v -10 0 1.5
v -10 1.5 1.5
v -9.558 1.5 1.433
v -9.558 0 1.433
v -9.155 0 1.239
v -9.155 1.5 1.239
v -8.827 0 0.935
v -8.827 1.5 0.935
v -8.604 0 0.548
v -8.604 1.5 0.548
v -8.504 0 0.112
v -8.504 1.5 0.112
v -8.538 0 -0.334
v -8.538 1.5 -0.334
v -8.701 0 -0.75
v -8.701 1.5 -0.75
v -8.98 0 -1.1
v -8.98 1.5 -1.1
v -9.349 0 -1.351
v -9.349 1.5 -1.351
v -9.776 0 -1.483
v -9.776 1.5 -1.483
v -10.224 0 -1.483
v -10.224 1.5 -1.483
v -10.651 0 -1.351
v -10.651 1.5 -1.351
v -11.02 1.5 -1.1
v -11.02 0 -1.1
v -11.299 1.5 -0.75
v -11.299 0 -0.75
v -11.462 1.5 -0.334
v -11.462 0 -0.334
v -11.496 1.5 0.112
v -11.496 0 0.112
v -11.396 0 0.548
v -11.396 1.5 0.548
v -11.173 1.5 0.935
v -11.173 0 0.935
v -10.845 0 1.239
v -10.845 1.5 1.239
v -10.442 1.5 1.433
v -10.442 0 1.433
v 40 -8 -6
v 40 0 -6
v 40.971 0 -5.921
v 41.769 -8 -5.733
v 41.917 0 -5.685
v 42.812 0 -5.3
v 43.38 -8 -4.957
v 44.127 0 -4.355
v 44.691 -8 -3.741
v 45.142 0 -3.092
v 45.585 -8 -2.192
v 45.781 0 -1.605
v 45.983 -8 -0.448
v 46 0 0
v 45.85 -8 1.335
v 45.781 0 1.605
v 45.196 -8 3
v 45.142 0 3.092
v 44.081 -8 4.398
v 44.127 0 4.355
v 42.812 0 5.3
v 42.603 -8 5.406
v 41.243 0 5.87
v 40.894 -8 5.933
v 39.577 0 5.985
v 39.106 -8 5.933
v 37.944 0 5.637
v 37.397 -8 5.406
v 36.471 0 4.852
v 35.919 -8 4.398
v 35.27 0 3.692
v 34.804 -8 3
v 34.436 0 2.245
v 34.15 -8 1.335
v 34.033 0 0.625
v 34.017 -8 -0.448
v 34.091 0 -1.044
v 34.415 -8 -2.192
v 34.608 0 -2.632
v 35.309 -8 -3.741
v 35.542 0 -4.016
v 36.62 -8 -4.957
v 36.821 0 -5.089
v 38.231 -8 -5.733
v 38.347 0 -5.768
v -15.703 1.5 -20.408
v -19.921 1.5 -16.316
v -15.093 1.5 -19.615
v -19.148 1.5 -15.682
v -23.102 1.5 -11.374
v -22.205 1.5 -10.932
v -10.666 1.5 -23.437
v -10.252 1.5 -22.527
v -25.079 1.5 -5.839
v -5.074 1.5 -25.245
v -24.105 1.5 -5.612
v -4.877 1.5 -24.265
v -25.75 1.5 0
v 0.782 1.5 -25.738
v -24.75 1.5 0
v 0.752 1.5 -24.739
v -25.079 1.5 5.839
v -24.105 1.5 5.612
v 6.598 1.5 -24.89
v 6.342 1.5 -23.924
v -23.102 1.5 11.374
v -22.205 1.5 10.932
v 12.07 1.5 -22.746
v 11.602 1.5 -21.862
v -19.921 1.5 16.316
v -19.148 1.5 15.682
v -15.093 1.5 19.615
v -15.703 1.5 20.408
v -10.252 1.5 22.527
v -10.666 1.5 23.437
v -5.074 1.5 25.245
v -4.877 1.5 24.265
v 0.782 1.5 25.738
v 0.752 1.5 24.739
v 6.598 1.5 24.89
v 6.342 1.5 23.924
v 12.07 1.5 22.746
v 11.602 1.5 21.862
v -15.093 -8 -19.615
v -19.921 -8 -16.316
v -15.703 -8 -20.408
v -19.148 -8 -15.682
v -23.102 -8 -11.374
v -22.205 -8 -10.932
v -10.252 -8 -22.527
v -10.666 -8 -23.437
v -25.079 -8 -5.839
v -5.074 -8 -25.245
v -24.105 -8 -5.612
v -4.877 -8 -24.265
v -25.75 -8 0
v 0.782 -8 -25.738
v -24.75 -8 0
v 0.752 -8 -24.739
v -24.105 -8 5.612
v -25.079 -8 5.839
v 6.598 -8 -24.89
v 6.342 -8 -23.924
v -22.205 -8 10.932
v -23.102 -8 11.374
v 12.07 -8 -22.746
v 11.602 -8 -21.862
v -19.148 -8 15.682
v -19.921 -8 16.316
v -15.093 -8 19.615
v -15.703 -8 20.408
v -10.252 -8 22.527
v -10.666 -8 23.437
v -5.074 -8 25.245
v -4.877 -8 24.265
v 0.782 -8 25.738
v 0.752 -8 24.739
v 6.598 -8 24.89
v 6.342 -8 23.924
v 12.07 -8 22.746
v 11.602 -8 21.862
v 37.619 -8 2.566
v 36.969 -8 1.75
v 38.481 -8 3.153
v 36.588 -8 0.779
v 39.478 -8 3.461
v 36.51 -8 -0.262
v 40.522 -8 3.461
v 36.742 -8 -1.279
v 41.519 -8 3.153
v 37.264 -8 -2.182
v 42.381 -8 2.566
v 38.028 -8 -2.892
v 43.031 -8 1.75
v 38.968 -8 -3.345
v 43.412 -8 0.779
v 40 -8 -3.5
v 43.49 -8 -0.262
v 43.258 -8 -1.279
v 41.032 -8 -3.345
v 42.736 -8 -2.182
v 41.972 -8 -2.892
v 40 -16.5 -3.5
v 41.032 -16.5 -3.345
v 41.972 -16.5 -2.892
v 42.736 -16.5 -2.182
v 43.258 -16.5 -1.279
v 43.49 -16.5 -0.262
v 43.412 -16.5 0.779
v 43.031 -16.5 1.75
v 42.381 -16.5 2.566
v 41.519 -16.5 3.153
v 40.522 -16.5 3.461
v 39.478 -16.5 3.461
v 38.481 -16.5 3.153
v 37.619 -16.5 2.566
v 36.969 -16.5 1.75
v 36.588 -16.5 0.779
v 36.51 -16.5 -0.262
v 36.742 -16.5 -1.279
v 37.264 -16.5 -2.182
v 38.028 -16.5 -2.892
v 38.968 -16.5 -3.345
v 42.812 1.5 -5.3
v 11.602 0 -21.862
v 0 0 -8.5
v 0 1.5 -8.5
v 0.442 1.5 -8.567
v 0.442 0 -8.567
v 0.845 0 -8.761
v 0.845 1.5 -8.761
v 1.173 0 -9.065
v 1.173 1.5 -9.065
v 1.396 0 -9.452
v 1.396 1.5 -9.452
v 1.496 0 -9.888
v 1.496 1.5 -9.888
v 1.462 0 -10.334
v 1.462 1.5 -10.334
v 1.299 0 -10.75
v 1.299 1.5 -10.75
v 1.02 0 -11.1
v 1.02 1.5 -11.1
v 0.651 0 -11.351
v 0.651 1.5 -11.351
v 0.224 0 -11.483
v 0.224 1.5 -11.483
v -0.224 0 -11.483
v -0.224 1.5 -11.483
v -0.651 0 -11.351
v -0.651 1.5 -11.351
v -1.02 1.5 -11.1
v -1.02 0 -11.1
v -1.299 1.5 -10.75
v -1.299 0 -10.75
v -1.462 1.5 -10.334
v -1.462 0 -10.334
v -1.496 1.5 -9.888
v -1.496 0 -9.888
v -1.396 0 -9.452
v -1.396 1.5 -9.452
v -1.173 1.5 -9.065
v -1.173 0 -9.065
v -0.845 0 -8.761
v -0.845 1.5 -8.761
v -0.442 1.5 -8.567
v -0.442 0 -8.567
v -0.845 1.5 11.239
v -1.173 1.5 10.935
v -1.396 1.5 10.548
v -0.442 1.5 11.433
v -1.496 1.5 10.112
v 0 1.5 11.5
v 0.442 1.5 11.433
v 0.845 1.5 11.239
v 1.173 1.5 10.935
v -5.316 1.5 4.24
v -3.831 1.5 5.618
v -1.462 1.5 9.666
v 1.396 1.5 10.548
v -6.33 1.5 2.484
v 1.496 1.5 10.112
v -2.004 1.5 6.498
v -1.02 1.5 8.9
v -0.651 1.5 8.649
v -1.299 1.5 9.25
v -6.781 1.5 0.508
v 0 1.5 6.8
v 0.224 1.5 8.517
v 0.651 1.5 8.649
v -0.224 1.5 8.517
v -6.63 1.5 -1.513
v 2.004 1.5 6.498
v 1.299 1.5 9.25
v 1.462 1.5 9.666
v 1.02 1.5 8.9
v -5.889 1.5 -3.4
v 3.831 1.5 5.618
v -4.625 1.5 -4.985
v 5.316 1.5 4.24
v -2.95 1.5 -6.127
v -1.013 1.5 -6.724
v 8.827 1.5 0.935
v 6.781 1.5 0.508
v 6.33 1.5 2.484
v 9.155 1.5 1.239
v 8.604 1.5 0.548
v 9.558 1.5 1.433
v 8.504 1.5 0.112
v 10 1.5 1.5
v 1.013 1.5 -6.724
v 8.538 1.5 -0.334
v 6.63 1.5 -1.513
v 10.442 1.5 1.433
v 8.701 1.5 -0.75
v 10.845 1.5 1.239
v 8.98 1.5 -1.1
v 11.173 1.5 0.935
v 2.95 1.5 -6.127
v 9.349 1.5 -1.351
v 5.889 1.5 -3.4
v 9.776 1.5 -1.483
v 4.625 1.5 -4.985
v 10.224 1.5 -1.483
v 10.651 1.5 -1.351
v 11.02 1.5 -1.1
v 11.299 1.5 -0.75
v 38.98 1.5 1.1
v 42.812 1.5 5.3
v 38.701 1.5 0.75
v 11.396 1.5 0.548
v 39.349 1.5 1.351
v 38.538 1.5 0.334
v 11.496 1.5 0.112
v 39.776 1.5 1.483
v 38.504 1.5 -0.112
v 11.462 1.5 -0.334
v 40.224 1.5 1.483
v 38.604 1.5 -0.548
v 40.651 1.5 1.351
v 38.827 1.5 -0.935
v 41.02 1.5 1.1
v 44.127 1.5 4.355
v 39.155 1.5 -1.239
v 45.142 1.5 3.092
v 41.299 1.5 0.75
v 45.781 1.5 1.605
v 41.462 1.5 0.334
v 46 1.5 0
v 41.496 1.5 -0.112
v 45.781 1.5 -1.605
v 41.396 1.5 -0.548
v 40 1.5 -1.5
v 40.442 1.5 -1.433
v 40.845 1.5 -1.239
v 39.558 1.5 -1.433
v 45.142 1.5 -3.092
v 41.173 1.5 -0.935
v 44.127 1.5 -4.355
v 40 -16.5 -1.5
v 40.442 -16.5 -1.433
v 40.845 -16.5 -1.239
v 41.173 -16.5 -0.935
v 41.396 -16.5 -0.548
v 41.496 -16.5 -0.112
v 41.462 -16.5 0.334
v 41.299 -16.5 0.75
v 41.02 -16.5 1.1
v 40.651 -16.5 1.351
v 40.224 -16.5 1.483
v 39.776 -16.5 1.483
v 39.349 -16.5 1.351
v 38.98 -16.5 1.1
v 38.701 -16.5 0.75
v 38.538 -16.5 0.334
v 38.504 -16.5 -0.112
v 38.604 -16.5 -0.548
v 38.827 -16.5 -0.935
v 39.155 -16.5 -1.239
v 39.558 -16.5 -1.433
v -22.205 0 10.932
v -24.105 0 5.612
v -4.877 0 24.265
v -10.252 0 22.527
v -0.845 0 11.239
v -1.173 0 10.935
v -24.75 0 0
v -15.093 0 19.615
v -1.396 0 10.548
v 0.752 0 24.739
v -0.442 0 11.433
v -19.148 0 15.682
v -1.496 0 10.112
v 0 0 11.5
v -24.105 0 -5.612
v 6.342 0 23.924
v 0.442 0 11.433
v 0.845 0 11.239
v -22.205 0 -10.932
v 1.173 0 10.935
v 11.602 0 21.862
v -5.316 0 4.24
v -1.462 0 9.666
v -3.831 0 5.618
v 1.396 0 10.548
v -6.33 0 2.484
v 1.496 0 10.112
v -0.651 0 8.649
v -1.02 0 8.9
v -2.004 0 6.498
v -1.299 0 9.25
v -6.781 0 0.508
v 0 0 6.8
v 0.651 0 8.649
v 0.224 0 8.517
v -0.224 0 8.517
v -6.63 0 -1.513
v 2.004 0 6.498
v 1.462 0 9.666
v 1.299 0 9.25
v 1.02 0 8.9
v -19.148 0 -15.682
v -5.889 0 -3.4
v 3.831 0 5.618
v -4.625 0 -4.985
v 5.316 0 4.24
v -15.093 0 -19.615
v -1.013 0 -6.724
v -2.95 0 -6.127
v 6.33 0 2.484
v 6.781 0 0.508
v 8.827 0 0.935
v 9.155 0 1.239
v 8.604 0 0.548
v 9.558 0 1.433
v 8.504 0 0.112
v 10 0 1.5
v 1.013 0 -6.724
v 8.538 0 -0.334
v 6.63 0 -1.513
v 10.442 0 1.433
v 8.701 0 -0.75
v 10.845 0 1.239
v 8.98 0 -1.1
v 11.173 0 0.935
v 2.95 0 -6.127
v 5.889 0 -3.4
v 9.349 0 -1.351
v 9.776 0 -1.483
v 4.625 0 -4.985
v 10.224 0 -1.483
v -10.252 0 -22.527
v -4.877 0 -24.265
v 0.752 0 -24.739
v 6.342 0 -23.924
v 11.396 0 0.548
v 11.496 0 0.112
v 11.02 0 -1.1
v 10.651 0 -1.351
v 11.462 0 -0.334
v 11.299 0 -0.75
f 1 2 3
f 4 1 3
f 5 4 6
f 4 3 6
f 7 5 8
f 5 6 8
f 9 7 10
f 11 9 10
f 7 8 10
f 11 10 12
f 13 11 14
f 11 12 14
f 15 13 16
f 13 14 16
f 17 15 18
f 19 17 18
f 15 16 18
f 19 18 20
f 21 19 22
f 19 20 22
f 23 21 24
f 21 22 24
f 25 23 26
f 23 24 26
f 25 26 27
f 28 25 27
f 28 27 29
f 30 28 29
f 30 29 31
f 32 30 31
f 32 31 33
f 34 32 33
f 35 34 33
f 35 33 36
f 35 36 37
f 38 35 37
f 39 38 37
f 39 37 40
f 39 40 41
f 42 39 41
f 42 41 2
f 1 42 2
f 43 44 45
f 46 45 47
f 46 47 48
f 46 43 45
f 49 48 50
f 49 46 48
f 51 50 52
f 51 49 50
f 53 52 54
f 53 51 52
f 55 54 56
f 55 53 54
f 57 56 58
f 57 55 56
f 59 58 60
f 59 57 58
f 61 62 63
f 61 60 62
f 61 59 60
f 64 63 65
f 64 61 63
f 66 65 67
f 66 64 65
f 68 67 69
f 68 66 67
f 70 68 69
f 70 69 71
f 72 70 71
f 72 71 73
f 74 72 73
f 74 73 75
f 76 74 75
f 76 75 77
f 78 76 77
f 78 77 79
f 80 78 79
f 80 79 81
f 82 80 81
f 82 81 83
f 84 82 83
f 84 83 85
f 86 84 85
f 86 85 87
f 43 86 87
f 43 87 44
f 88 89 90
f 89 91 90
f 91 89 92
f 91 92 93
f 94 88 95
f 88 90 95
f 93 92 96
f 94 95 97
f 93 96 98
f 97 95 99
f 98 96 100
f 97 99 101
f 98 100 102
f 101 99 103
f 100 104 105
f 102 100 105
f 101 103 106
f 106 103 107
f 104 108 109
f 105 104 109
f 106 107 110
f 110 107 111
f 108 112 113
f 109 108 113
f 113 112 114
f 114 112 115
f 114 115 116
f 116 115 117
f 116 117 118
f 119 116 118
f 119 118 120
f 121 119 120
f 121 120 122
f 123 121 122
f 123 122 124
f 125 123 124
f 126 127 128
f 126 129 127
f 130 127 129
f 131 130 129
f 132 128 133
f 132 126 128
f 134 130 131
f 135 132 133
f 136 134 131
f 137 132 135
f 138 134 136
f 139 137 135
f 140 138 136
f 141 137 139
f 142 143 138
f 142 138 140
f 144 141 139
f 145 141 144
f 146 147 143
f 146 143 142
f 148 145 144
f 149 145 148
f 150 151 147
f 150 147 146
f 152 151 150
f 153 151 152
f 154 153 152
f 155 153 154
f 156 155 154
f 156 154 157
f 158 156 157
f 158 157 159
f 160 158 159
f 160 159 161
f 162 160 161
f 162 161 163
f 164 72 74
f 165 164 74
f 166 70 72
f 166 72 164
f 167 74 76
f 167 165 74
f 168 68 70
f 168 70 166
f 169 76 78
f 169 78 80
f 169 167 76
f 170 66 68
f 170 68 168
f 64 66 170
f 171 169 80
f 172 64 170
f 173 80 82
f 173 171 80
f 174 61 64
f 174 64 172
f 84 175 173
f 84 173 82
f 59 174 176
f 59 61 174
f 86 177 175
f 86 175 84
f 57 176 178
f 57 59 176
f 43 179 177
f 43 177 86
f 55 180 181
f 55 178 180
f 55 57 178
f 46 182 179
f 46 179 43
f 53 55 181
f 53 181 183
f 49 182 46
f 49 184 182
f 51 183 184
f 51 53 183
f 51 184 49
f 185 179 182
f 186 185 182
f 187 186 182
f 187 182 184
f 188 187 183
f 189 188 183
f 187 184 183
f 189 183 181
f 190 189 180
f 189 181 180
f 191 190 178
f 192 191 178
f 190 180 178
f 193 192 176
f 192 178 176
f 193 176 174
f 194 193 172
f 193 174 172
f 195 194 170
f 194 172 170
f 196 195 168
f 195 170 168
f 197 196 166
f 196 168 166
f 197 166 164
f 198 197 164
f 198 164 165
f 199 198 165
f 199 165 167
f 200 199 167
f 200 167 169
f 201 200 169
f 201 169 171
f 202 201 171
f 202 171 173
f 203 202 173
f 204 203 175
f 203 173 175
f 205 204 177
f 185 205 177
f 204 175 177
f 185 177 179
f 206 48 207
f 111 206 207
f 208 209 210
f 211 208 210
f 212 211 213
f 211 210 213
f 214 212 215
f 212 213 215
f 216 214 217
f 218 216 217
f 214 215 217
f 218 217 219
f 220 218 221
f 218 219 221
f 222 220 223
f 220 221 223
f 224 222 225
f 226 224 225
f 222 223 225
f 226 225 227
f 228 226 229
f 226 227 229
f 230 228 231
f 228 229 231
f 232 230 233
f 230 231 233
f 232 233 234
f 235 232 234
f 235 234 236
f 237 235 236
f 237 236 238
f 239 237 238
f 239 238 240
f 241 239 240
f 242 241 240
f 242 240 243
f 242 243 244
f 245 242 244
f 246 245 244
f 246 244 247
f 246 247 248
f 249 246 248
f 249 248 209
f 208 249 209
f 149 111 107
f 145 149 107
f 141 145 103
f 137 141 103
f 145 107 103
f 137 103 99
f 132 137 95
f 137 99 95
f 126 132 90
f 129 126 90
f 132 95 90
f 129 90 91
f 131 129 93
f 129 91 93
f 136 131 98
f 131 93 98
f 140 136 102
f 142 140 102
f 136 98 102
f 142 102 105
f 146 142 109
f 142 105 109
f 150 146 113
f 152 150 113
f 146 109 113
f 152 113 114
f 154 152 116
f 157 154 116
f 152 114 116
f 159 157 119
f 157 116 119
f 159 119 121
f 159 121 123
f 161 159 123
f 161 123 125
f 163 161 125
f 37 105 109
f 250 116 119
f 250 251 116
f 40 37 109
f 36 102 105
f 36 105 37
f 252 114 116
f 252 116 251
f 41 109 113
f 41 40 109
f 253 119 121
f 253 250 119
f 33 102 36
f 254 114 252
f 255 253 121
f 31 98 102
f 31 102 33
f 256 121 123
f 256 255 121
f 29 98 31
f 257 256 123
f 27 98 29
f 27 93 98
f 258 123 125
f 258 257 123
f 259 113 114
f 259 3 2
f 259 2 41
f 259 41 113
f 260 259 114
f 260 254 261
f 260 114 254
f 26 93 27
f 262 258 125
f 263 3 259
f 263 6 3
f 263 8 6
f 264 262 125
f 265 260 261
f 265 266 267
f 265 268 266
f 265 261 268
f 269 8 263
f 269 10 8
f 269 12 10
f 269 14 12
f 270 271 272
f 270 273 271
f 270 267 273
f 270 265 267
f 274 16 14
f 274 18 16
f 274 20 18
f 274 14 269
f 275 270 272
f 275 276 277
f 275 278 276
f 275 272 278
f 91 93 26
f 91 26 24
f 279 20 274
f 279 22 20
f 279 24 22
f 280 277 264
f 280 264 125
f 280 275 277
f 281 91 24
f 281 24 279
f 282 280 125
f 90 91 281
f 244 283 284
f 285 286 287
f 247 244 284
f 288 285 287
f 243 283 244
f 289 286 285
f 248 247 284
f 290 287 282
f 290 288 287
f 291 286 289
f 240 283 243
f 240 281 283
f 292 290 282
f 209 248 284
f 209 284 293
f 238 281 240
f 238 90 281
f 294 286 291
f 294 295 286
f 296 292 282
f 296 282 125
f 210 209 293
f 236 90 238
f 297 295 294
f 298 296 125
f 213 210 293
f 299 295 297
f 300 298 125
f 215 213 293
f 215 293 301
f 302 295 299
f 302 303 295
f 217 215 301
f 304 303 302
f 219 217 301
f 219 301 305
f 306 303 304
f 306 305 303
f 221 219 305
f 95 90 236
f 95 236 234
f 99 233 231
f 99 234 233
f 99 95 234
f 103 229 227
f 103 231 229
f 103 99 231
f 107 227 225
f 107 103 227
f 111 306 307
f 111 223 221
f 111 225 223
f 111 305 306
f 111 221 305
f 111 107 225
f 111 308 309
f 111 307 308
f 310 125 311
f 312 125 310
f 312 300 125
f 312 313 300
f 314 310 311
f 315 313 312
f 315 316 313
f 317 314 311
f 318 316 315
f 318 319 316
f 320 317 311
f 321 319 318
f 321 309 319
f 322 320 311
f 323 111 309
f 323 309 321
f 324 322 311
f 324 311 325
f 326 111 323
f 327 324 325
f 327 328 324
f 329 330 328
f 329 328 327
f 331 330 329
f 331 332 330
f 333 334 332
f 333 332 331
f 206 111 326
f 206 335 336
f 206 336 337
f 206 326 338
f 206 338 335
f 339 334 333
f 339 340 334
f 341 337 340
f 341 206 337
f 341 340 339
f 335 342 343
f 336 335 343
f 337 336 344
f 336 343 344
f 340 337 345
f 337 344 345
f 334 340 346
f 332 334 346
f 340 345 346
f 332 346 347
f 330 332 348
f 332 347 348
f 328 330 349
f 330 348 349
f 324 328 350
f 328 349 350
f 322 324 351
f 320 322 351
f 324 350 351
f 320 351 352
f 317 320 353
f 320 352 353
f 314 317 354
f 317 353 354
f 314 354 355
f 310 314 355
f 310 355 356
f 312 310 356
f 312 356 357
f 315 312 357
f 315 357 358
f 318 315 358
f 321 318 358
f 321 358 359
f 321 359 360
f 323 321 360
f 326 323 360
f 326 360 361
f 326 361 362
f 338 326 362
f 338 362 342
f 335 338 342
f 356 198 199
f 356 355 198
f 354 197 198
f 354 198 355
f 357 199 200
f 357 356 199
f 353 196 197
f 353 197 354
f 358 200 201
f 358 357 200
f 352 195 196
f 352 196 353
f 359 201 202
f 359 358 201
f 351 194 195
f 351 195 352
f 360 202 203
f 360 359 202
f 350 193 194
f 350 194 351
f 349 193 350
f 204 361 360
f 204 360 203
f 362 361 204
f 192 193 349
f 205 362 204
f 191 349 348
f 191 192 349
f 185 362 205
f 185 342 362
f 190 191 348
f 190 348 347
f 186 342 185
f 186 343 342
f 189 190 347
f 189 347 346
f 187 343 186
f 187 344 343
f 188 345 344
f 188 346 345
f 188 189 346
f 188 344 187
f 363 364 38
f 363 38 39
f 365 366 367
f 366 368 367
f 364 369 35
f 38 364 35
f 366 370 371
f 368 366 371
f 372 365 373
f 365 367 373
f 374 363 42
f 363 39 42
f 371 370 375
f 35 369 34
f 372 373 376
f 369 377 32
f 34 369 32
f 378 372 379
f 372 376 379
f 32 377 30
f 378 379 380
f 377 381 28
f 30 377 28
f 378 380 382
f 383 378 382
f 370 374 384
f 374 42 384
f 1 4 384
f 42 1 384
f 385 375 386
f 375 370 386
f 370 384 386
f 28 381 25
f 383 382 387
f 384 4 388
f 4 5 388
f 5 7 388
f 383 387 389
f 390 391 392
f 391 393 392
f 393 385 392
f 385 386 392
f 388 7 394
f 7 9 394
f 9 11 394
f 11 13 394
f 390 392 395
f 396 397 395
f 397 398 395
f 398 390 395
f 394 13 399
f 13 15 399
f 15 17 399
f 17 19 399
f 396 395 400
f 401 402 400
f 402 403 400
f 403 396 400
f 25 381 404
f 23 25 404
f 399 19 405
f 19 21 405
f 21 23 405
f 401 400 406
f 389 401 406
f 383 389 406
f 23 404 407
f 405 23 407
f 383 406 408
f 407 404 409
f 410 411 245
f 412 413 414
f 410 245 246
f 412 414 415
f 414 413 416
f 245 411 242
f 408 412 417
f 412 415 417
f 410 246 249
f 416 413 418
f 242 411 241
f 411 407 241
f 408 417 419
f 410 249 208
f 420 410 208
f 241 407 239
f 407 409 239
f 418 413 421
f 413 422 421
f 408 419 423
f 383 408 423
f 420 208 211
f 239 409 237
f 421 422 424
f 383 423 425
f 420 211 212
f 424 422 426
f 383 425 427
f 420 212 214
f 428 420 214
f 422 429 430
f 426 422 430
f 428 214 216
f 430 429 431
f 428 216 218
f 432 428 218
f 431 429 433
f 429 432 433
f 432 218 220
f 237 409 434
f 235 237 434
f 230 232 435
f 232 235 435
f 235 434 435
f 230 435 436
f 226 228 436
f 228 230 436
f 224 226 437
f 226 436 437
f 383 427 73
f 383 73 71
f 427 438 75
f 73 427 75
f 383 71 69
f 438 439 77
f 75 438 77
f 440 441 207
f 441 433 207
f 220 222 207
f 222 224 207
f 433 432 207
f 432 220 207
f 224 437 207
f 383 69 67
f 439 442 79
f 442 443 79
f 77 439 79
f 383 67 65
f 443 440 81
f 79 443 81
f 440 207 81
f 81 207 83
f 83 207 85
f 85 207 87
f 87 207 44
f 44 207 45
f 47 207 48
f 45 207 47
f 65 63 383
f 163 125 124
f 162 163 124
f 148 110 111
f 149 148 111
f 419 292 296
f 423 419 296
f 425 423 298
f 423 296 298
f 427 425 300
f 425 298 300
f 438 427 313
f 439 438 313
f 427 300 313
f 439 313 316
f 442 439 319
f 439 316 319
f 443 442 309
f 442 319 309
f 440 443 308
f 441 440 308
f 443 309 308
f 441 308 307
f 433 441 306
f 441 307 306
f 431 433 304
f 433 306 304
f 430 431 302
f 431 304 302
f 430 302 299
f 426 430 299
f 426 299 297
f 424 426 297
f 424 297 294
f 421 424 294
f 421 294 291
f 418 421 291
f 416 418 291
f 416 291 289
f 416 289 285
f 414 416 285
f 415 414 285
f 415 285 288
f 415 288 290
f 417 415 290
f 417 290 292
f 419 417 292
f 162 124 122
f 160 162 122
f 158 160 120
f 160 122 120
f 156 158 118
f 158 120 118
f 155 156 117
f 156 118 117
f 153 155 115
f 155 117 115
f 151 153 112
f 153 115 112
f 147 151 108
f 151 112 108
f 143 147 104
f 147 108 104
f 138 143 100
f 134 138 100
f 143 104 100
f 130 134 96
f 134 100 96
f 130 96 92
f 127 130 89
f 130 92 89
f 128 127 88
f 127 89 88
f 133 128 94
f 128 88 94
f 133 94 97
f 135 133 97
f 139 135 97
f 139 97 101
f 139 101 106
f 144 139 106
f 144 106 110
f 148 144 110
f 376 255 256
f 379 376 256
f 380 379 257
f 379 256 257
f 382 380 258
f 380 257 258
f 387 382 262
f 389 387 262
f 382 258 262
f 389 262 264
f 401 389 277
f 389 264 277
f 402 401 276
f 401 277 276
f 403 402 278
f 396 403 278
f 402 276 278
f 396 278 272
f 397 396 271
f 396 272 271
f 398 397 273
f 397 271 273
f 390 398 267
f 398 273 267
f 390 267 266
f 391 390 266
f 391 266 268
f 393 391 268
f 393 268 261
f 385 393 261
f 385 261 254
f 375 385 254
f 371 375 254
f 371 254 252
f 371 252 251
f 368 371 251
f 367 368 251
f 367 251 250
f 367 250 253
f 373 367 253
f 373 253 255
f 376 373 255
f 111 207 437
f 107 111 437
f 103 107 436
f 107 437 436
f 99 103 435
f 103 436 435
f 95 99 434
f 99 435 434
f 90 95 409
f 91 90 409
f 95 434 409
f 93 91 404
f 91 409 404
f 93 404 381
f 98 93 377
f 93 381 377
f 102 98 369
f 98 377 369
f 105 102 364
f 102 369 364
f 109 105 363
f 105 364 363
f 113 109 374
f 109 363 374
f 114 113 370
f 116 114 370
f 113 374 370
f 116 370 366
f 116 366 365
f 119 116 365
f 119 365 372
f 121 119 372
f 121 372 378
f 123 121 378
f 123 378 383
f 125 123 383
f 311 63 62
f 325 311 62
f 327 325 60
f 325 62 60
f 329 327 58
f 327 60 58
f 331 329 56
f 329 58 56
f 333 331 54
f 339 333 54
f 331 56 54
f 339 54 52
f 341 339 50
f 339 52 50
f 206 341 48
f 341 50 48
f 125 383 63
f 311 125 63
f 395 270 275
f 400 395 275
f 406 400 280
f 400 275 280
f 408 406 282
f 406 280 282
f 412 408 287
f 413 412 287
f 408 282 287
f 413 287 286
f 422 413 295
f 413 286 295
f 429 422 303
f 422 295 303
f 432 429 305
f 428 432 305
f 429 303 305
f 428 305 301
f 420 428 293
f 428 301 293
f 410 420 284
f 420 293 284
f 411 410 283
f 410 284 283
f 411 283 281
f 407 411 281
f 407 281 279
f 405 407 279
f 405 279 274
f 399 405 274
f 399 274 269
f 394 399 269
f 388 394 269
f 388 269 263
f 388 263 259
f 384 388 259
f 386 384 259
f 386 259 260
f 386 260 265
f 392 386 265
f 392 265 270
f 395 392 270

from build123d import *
from build123d.topology import SkipClean

# Parameters (mm, degrees)
EXTRUDE_1_DEPTH      = 1.5
EXTRUDE_2_DEPTH      = 8
EXTRUDE_2_DEPTH_BACK = 1.5
SKETCH_5_R           = 6.8
SKETCH_5_R_2         = 1.5
CUT_EXTRUDE_1_DEPTH  = 54.565964007
EXTRUDE_START        = 8
SKETCH_6_R           = 6
EXTRUDE_3_DEPTH      = 8
SKETCH_7_R           = 3.5
EXTRUDE_4_DEPTH      = 8.5
SKETCH_9_R           = 1.5
CUT_EXTRUDE_2_DEPTH  = 56.705138901


with BuildPart() as part:
    # 草图2 → 凸台-拉伸1 (new body)
    with BuildSketch(Plane(origin=(0, 0, 0), x_dir=(1, 0, 0), z_dir=(0, 1, 0))):
        with BuildLine():
            Line((42.8125, 5.299985259), (11.6015625, 21.862439195))
            ThreePointArc((11.6015625, 21.862439195), (-24.75, 0), (11.6015625, -21.862439195))
            Line((11.6015625, -21.862439195), (42.8125, -5.299985259))
            ThreePointArc((42.8125, -5.299985259), (46, 0), (42.8125, 5.299985259))
        make_face()
    extrude(amount=EXTRUDE_1_DEPTH)

    # 草图5 → 切除-拉伸1 (cut, through all)
    with BuildSketch(Plane(origin=(0, 1.5, 0), x_dir=(1, 0, 0), z_dir=(0, 1, 0))):
        with Locations(Location((0, 0, 0), (0, 0, 270))):
            Circle(SKETCH_5_R)
        with Locations(Location((0, 10, 0), (0, 0, 270))):
            Circle(SKETCH_5_R_2)
        with Locations(Location((10, 0, 0), (0, 0, 270))):
            Circle(SKETCH_5_R_2)
        with Locations(Location((0, -10, 0), (0, 0, 270))):
            Circle(SKETCH_5_R_2)
        with Locations(Location((-10, 0, 0), (0, 0, 270))):
            Circle(SKETCH_5_R_2)
    extrude(amount=-CUT_EXTRUDE_1_DEPTH, mode=Mode.SUBTRACT)

    # 草图6 → 凸台-拉伸3 (add)
    with SkipClean():  # the faces are left unmerged after this step: merging them gives an invalid solid
        with BuildSketch(Plane.XZ.offset(EXTRUDE_START)):
            with Locations(Location((40, 0, 0), (0, 0, 270))):
                Circle(SKETCH_6_R)
        extrude(amount=-EXTRUDE_3_DEPTH)

    # 草图7 → 凸台-拉伸4 (add)
    with SkipClean():  # the faces are left unmerged after this step: merging them gives an invalid solid
        with BuildSketch(Plane.XZ.offset(8)):
            with Locations(Location((40, 0, 0), (0, 0, 270))):
                Circle(SKETCH_7_R)
        extrude(amount=EXTRUDE_4_DEPTH)

    # 草图9 → 切除-拉伸2 (cut, through all)
    with SkipClean():  # the faces are left unmerged after this step: merging them gives an invalid solid
        with BuildSketch(Plane.XZ.offset(16.5)):
            with Locations(Location((40, 0, 0), (0, 0, 270))):
                Circle(SKETCH_9_R)
        extrude(amount=-CUT_EXTRUDE_2_DEPTH, mode=Mode.SUBTRACT)


with BuildPart() as body_2:
    # 草图3 → 凸台-拉伸2 (new, two sides: drawn at the far end of the back side and taken through both)
    with BuildSketch(Plane.XZ.offset(-EXTRUDE_2_DEPTH_BACK)):
        with BuildLine():
            ThreePointArc((11.6015625, -21.862439195), (-24.75, 0), (11.6015625, 21.862439195))
            Line((11.6015625, 21.862439195), (12.0703125, 22.745770072))
            ThreePointArc((12.0703125, 22.745770072), (-25.75, 0), (12.0703125, -22.745770072))
            Line((12.0703125, -22.745770072), (11.6015625, -21.862439195))
        make_face()
    extrude(amount=EXTRUDE_2_DEPTH + EXTRUDE_2_DEPTH_BACK)


solid = Compound([part.part, body_2.part])
